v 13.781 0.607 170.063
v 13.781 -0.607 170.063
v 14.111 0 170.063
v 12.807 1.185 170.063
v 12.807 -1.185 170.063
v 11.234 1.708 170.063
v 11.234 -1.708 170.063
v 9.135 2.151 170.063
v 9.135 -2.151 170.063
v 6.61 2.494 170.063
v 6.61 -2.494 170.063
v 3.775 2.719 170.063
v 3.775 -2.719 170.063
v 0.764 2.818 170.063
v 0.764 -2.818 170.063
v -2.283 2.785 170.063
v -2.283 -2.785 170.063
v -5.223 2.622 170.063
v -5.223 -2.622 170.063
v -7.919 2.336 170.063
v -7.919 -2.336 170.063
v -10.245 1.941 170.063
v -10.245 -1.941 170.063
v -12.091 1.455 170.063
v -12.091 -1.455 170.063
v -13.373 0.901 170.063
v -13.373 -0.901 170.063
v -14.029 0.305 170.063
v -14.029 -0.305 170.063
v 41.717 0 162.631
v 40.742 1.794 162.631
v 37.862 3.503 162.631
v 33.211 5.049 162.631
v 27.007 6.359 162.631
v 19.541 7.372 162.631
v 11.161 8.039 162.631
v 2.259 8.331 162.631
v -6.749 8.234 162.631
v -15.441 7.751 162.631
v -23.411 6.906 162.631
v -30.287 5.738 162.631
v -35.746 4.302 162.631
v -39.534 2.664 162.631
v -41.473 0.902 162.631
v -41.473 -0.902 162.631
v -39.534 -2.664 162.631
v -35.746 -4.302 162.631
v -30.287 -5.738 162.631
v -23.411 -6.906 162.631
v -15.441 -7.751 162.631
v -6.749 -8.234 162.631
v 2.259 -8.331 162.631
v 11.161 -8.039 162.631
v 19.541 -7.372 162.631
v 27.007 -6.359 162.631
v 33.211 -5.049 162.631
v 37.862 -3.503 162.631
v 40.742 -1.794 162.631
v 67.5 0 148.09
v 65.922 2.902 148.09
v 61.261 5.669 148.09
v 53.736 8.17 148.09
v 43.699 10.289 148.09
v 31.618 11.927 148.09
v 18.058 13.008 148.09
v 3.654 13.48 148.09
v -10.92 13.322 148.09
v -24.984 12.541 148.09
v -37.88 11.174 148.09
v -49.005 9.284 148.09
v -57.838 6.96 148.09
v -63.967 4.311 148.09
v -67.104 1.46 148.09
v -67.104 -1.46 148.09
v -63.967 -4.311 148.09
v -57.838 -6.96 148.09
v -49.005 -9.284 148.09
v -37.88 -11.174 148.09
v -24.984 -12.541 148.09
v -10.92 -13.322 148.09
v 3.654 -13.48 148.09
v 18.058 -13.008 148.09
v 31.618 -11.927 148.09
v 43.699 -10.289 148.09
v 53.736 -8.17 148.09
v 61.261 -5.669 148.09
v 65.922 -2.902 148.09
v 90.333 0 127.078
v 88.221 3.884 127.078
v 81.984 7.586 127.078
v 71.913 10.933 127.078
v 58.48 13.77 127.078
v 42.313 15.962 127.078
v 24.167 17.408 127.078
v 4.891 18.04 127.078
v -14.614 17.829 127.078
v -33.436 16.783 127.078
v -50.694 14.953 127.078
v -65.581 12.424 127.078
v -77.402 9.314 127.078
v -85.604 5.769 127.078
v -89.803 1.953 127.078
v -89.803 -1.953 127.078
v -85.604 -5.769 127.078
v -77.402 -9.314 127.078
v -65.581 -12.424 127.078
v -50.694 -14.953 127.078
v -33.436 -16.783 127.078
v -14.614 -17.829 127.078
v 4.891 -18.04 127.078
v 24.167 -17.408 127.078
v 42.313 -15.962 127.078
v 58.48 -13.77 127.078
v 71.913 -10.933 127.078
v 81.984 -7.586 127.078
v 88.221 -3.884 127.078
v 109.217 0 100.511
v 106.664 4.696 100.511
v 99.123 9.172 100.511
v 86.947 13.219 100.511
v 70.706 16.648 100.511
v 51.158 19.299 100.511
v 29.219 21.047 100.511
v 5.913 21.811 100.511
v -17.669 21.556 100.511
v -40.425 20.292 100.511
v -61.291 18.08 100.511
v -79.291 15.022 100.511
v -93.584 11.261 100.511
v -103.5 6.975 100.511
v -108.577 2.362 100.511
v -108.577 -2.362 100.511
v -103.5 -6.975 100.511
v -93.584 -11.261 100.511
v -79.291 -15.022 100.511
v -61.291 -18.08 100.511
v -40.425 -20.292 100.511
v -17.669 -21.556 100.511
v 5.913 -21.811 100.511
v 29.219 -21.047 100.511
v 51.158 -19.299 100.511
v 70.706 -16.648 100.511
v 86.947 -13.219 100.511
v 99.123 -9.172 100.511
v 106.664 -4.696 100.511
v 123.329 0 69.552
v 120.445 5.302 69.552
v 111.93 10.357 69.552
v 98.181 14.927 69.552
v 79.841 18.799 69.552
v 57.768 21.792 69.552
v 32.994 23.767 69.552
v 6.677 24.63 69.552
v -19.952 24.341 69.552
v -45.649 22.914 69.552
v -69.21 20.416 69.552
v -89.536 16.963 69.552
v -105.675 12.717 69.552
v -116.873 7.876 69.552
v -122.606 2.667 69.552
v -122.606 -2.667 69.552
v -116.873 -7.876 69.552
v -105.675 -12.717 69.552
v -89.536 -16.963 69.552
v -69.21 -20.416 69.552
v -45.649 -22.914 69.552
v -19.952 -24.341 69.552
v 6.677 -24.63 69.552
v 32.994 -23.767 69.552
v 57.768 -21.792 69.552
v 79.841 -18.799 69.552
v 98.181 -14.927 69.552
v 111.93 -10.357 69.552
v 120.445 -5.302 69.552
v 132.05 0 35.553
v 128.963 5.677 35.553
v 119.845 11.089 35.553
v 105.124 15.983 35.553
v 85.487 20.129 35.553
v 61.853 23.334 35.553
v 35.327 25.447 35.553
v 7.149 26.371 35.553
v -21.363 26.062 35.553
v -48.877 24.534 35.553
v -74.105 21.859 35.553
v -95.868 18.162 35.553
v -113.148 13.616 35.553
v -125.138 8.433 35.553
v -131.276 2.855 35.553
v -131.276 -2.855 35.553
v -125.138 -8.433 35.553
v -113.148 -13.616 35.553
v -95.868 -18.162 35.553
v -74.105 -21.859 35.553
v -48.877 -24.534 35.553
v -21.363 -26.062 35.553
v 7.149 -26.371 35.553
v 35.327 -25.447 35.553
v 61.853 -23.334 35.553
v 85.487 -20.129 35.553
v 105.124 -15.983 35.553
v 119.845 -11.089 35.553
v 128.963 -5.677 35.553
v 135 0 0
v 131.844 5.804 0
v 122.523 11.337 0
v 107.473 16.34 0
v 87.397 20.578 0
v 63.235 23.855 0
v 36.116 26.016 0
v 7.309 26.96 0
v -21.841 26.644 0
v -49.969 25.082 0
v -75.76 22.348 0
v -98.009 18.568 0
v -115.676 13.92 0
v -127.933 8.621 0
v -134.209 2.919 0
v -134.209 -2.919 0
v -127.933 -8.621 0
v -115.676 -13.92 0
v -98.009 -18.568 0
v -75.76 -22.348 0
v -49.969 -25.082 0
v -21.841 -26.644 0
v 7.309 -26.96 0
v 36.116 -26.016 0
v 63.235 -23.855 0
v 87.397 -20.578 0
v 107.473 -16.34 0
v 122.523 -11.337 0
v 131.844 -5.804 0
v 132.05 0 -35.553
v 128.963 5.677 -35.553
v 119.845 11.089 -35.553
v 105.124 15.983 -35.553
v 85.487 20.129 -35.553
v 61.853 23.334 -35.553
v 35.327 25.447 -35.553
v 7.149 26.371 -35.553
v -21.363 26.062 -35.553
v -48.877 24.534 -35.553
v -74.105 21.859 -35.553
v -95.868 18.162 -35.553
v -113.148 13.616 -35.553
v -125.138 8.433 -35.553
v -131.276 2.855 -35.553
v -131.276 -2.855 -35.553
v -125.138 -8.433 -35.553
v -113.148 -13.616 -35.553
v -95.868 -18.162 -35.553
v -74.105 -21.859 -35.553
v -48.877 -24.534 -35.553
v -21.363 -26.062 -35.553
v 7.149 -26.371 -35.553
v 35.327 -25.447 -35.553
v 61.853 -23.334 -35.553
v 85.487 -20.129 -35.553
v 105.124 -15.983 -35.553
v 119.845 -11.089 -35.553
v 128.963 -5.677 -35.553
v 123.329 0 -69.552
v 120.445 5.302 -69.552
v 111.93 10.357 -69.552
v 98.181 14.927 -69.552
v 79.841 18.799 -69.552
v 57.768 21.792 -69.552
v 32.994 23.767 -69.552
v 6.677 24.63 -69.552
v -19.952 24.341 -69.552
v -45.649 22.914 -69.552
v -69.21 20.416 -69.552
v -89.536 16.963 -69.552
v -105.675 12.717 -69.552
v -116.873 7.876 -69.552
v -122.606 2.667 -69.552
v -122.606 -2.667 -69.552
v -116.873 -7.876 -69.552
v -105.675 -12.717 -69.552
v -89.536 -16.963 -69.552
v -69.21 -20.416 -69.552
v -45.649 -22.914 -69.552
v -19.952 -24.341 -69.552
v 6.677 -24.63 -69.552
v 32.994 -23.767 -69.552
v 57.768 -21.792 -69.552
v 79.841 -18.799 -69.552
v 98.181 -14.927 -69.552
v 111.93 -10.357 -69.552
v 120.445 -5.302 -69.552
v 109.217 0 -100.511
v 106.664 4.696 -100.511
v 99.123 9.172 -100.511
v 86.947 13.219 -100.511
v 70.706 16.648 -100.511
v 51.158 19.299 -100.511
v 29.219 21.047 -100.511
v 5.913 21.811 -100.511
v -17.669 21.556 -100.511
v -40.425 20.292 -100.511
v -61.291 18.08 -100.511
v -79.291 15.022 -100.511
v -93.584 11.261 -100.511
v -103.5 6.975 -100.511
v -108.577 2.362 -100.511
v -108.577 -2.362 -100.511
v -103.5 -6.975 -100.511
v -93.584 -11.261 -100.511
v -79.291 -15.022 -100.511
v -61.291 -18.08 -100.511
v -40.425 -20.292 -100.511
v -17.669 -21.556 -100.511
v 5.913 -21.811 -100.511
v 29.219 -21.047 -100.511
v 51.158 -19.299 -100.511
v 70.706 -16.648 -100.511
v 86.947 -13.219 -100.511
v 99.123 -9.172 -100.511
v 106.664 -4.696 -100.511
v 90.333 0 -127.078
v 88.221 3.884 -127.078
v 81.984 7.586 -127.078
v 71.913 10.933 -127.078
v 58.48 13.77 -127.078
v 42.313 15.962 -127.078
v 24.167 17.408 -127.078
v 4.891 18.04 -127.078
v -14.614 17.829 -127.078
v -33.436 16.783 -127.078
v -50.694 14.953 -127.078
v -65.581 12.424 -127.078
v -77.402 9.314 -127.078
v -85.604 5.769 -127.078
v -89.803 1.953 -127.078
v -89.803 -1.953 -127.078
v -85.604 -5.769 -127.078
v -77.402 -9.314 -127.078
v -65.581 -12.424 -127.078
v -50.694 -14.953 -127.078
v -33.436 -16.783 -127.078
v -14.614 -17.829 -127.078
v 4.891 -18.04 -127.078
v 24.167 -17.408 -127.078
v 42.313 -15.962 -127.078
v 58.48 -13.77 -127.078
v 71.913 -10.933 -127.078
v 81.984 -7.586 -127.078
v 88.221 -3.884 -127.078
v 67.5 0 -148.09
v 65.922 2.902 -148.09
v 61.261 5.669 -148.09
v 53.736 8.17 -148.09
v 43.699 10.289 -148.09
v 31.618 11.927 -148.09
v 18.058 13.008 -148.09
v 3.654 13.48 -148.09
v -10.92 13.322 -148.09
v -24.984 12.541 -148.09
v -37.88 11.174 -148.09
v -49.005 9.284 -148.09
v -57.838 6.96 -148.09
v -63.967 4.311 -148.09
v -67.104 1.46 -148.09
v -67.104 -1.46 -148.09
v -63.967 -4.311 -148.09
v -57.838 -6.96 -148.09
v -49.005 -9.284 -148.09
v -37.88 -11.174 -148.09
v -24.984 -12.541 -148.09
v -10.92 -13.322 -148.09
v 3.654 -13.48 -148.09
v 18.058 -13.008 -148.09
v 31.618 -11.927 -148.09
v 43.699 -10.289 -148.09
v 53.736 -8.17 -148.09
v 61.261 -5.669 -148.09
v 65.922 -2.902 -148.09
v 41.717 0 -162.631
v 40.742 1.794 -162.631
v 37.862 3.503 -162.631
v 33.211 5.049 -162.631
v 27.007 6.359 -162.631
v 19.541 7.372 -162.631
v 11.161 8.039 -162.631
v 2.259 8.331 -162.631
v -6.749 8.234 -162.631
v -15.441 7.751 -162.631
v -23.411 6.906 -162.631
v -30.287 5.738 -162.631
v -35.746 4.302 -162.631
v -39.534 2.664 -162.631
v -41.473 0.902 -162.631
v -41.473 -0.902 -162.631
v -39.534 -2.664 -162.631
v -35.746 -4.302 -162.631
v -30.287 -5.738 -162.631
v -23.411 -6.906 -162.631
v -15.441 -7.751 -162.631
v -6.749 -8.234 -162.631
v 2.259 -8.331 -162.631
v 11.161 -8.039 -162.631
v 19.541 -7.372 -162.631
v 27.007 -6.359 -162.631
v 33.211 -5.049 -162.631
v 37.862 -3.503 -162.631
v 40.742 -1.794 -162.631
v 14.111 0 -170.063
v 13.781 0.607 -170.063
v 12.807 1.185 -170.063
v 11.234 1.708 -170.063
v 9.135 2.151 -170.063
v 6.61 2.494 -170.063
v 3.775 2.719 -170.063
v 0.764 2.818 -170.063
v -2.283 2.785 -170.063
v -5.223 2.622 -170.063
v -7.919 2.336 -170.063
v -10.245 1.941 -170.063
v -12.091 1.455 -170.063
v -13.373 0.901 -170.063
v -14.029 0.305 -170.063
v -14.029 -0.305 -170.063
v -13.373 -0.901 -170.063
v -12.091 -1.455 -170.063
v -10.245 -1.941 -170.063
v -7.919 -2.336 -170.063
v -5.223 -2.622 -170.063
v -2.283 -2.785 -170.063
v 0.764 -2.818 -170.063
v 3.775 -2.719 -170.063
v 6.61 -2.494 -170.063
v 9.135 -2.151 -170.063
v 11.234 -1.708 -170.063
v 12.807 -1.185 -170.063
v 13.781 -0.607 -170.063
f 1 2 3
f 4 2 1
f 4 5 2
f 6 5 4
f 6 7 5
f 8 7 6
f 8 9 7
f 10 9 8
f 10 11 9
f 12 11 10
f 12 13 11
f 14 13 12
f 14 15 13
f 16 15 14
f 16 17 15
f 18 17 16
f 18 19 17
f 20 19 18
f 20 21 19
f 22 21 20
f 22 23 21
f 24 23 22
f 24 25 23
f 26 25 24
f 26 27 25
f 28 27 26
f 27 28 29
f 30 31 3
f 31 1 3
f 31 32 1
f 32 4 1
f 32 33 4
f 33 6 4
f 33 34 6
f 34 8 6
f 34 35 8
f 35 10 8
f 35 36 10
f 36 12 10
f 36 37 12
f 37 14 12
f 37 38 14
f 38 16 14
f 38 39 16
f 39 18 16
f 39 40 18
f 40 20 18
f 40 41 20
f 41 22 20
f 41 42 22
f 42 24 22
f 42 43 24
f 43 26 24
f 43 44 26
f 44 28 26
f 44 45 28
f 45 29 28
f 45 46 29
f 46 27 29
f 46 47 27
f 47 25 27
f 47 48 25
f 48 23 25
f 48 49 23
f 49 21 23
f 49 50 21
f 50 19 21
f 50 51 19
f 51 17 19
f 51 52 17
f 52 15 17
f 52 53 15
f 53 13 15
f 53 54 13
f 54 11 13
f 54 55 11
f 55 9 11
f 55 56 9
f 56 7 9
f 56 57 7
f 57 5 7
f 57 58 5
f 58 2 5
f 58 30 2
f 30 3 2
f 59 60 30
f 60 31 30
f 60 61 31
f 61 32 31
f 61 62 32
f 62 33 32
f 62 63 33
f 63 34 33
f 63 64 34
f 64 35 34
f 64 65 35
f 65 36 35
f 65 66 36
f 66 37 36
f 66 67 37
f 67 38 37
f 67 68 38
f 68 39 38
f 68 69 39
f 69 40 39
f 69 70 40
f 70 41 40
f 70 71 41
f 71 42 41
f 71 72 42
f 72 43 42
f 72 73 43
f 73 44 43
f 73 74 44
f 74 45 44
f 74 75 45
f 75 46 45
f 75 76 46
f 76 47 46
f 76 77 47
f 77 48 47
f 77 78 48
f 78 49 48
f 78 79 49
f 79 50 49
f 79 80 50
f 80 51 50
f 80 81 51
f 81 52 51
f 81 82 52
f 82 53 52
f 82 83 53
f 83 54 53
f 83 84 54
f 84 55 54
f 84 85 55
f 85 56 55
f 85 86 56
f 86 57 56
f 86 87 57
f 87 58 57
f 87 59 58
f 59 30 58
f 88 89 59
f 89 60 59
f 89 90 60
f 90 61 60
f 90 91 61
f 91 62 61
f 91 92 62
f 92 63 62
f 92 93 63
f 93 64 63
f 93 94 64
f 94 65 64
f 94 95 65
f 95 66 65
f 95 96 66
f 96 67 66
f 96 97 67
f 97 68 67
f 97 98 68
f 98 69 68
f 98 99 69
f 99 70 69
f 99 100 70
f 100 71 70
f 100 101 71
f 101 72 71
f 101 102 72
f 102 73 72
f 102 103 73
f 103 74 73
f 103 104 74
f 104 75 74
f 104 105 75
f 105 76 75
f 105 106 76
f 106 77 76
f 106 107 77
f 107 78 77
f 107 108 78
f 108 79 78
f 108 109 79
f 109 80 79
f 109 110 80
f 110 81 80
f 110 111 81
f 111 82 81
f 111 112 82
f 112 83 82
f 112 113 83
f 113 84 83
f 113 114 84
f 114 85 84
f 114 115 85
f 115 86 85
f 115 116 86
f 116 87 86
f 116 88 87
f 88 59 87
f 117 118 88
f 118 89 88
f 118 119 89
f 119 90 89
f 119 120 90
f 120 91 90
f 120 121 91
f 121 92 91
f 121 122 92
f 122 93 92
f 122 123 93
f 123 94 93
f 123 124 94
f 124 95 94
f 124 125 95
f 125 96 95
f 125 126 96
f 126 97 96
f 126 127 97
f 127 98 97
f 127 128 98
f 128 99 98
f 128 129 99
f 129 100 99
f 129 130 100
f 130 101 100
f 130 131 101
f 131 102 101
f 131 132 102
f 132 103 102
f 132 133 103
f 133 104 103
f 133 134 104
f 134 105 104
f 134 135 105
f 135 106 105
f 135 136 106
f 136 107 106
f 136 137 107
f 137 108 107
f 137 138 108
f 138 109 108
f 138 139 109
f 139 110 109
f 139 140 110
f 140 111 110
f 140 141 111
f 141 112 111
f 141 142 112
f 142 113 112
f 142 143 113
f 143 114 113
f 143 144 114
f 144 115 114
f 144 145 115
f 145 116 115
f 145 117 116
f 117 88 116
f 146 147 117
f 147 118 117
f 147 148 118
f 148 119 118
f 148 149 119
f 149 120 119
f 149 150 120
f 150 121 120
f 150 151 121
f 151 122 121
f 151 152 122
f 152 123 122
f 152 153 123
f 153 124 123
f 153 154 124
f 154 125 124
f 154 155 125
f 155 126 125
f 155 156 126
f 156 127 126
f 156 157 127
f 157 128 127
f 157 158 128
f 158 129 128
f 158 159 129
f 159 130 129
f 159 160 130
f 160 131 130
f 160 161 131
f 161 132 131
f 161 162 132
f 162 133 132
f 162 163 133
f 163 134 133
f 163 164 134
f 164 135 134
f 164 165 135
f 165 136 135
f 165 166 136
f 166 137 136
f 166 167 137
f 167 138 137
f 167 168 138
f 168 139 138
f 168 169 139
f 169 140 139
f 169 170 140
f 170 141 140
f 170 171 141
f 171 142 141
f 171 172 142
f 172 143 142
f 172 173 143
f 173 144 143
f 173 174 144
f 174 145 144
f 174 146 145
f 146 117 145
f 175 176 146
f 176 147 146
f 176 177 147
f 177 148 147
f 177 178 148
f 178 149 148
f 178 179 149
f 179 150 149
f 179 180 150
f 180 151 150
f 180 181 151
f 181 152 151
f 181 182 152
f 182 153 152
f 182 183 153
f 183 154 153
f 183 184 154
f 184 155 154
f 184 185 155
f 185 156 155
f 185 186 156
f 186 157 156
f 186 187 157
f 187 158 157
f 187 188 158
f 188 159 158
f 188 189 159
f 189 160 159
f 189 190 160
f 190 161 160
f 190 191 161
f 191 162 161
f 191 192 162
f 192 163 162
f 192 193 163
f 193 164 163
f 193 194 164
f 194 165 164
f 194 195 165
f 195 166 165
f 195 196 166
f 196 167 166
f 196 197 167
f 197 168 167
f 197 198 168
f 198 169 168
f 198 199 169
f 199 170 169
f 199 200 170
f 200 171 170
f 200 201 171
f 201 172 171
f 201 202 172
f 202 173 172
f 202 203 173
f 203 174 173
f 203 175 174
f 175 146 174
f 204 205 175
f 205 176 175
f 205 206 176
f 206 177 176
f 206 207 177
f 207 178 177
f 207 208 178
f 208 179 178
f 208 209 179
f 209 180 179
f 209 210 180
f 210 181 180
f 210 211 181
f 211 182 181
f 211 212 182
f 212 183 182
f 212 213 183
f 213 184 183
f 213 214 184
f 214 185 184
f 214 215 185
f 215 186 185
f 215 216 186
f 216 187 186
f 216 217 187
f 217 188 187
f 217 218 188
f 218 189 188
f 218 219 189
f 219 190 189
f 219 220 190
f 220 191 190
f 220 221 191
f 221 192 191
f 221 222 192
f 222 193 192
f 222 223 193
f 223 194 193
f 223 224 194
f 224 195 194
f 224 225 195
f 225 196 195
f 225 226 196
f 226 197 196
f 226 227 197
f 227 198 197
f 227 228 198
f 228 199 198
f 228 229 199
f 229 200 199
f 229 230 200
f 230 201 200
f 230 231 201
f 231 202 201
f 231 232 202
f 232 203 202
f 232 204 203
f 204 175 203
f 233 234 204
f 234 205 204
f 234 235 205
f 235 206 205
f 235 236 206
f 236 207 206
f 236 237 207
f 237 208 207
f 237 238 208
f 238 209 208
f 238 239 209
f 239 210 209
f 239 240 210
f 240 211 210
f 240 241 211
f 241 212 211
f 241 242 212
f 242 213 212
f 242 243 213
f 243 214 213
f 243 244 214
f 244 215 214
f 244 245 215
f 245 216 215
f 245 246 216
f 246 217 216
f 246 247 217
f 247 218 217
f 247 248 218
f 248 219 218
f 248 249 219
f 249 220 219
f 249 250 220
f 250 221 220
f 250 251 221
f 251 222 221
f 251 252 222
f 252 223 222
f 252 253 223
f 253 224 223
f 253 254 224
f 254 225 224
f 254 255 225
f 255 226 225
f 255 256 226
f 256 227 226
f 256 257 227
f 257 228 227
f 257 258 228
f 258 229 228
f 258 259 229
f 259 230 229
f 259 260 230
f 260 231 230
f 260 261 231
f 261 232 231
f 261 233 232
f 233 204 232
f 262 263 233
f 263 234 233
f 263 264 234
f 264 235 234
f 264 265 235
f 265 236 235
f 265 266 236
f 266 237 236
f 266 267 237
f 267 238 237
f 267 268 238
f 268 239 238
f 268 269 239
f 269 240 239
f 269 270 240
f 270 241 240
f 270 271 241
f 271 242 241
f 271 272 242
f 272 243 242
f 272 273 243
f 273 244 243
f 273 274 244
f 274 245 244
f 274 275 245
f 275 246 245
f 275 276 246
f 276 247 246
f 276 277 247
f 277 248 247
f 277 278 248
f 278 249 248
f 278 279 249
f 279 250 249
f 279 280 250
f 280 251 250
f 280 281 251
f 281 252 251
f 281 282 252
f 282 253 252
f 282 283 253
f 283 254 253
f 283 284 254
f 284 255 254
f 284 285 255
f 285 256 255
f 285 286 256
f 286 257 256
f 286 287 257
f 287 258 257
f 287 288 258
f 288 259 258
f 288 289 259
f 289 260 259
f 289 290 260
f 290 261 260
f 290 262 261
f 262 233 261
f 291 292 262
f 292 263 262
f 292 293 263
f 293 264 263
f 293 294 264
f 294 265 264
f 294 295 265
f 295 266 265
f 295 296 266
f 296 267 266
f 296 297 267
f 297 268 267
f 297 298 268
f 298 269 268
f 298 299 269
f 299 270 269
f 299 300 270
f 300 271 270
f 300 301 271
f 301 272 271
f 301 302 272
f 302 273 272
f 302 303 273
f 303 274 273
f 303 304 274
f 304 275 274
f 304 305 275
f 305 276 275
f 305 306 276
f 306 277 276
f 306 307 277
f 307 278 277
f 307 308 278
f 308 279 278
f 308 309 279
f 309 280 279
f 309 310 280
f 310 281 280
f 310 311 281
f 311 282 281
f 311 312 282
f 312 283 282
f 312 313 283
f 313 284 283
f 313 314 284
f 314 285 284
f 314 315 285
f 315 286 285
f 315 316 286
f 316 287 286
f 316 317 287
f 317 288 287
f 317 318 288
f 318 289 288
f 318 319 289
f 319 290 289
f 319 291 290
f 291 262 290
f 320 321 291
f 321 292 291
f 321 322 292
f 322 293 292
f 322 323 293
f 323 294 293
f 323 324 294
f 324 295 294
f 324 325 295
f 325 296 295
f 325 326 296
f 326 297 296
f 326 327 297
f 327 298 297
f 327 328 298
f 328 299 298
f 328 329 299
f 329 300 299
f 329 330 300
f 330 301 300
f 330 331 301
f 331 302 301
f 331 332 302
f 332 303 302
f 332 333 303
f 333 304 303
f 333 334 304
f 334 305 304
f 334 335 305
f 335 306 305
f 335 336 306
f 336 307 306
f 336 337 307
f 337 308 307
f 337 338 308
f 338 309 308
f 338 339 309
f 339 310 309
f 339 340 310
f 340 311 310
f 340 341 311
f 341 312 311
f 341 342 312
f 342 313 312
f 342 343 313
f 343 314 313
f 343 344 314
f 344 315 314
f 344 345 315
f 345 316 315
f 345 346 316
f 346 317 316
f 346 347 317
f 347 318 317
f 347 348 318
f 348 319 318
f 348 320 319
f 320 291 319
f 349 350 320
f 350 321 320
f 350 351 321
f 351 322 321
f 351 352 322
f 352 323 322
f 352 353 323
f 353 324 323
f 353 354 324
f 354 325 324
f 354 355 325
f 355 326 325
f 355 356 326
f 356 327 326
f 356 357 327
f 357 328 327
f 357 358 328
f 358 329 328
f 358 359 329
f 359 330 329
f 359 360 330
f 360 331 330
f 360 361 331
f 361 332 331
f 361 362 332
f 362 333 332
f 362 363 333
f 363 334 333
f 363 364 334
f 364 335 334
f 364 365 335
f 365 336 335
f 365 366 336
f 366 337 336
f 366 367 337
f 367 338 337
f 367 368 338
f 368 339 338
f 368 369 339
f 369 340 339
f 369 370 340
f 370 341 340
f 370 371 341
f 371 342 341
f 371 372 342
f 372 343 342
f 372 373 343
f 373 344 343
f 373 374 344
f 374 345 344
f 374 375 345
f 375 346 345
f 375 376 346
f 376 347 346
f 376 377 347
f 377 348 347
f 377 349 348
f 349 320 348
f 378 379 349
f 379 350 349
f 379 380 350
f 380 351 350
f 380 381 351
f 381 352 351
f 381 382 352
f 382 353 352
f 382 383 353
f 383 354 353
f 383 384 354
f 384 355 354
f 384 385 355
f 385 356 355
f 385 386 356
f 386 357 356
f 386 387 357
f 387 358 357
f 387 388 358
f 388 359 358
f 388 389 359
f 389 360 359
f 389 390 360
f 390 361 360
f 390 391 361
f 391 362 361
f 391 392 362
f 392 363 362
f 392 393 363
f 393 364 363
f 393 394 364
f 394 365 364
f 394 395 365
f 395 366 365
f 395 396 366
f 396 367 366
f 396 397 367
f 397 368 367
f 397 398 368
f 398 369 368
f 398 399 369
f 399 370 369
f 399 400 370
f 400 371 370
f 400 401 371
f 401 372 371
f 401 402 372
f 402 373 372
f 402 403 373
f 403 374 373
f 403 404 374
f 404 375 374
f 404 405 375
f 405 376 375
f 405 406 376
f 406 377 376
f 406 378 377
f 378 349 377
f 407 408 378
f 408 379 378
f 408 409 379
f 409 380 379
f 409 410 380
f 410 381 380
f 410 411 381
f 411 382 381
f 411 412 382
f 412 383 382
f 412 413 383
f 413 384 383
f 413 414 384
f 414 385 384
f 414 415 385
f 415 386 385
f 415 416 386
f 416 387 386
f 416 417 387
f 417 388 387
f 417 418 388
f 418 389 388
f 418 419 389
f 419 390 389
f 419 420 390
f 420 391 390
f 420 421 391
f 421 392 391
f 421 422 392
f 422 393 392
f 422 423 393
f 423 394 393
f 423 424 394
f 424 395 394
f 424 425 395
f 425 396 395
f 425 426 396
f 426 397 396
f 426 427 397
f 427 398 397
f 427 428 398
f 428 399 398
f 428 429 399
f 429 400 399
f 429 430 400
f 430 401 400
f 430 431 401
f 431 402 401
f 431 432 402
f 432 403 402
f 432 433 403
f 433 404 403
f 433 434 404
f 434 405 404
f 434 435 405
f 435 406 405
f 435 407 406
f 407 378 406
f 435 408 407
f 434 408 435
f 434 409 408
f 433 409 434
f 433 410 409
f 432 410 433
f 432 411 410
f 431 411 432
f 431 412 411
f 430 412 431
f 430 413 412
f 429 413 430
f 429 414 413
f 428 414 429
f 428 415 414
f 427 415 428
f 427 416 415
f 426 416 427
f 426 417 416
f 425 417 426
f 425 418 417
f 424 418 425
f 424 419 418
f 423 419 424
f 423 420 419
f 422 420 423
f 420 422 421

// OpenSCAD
// Generated by SolidPython 1.0.1 on 2020-07-29 00:46:51


scale(v = [15, 3, 19]) {
	sphere(r = 9);
}
/***********************************************
*********      SolidPython code:      **********
************************************************
 
# import packages: SolidPython
from solid import *
from solid.utils import *
from itertools import chain, combinations, permutations


class Resize:

    def __init__(self, scad_file):
        self.scad_file = scad_file
        #self.scad_file = import_scad(scad_file)
        # cone/cylinder param:
        self.r1 = 0
        self.r2 = 0
        self.h = 0
        # rectangular prism param:
        self.w = 0
        self.l = 0
        # ellipse param:
        self.r = 0

    # import OpenScad code (file name corresponds to shape)


    # classify shape + parameters
    def assign(self, param1, param2, param3):
        if self.scad_file == 'cone.scad':
            self.r1 = param1
            self.r2 = param2
            self.h = param3
        elif self.scad_file == 'cylinder.scad':
            self.r1 = param1
            self.r2 = param2
            self.h = param3
        elif self.scad_file == 'rectangularPrism.scad':
            self.h = param1
            self.l = param2
            self.w = param3
        else:
            self.r = param1
            self.h = param2

    # resize parameters
    def iterate(self):
        x = range(3, 20, 2)
        i = 1
        if self.scad_file == 'cone.scad':
            tempList = list(permutations(x, 2))
            for temp in tempList:
                param1 = temp[0]
                param2 = temp[1]
                filepath = 'produced_scad_files/' + 'cone' + str(param1) + '_' + str(param2) + '_' + '.scad'
                scad_render_to_file(cylinder(h=param1, r1=param2, r2=0), filepath)

        elif self.scad_file == 'cylinder.scad':
            tempList = list(permutations(x, 3))
            for temp in tempList:
                param1 = temp[0]
                param2 = temp[1]
                filepath = 'produced_scad_files/' + 'cylinder' + str(param1) + '_' + str(param2) + '_' + '.scad'
                scad_render_to_file(cylinder(h=param1, r1=param2, r2=param2), filepath)

        elif self.scad_file == 'rectangularPrism.scad':
            tempList = list(permutations(x, 3))
            for temp in tempList:
                param1 = temp[0]
                param2 = temp[1]
                param3 = temp[2]
                filepath = 'produced_scad_files/' + 'rectangularPrism' + str(param1) + '_' + str(param2) + '_' + str(
                    param3) + '.scad'
                scad_render_to_file(cube(size=(param1, param2, param3)), filepath)

        elif self.scad_file == 'ellipse.scad':
            tempList = list(permutations(x, 4))
            for temp in tempList:
                param1 = temp[0]
                param2 = temp[1]
                param3 = temp[2]
                param4 = temp[3]
                filepath = 'produced_scad_files/' + 'ellipse' + str(param1) + '_' + str(param2) + '_' + str(param3) + '_' + str(param4) + '.scad'
                scad_render_to_file(scale([param1, param2, param3])(sphere(r=param4)), filepath)

    def render_to_scadfile(self):
        scad_render_to_file(scad, 'example.scad') 
 
************************************************/
